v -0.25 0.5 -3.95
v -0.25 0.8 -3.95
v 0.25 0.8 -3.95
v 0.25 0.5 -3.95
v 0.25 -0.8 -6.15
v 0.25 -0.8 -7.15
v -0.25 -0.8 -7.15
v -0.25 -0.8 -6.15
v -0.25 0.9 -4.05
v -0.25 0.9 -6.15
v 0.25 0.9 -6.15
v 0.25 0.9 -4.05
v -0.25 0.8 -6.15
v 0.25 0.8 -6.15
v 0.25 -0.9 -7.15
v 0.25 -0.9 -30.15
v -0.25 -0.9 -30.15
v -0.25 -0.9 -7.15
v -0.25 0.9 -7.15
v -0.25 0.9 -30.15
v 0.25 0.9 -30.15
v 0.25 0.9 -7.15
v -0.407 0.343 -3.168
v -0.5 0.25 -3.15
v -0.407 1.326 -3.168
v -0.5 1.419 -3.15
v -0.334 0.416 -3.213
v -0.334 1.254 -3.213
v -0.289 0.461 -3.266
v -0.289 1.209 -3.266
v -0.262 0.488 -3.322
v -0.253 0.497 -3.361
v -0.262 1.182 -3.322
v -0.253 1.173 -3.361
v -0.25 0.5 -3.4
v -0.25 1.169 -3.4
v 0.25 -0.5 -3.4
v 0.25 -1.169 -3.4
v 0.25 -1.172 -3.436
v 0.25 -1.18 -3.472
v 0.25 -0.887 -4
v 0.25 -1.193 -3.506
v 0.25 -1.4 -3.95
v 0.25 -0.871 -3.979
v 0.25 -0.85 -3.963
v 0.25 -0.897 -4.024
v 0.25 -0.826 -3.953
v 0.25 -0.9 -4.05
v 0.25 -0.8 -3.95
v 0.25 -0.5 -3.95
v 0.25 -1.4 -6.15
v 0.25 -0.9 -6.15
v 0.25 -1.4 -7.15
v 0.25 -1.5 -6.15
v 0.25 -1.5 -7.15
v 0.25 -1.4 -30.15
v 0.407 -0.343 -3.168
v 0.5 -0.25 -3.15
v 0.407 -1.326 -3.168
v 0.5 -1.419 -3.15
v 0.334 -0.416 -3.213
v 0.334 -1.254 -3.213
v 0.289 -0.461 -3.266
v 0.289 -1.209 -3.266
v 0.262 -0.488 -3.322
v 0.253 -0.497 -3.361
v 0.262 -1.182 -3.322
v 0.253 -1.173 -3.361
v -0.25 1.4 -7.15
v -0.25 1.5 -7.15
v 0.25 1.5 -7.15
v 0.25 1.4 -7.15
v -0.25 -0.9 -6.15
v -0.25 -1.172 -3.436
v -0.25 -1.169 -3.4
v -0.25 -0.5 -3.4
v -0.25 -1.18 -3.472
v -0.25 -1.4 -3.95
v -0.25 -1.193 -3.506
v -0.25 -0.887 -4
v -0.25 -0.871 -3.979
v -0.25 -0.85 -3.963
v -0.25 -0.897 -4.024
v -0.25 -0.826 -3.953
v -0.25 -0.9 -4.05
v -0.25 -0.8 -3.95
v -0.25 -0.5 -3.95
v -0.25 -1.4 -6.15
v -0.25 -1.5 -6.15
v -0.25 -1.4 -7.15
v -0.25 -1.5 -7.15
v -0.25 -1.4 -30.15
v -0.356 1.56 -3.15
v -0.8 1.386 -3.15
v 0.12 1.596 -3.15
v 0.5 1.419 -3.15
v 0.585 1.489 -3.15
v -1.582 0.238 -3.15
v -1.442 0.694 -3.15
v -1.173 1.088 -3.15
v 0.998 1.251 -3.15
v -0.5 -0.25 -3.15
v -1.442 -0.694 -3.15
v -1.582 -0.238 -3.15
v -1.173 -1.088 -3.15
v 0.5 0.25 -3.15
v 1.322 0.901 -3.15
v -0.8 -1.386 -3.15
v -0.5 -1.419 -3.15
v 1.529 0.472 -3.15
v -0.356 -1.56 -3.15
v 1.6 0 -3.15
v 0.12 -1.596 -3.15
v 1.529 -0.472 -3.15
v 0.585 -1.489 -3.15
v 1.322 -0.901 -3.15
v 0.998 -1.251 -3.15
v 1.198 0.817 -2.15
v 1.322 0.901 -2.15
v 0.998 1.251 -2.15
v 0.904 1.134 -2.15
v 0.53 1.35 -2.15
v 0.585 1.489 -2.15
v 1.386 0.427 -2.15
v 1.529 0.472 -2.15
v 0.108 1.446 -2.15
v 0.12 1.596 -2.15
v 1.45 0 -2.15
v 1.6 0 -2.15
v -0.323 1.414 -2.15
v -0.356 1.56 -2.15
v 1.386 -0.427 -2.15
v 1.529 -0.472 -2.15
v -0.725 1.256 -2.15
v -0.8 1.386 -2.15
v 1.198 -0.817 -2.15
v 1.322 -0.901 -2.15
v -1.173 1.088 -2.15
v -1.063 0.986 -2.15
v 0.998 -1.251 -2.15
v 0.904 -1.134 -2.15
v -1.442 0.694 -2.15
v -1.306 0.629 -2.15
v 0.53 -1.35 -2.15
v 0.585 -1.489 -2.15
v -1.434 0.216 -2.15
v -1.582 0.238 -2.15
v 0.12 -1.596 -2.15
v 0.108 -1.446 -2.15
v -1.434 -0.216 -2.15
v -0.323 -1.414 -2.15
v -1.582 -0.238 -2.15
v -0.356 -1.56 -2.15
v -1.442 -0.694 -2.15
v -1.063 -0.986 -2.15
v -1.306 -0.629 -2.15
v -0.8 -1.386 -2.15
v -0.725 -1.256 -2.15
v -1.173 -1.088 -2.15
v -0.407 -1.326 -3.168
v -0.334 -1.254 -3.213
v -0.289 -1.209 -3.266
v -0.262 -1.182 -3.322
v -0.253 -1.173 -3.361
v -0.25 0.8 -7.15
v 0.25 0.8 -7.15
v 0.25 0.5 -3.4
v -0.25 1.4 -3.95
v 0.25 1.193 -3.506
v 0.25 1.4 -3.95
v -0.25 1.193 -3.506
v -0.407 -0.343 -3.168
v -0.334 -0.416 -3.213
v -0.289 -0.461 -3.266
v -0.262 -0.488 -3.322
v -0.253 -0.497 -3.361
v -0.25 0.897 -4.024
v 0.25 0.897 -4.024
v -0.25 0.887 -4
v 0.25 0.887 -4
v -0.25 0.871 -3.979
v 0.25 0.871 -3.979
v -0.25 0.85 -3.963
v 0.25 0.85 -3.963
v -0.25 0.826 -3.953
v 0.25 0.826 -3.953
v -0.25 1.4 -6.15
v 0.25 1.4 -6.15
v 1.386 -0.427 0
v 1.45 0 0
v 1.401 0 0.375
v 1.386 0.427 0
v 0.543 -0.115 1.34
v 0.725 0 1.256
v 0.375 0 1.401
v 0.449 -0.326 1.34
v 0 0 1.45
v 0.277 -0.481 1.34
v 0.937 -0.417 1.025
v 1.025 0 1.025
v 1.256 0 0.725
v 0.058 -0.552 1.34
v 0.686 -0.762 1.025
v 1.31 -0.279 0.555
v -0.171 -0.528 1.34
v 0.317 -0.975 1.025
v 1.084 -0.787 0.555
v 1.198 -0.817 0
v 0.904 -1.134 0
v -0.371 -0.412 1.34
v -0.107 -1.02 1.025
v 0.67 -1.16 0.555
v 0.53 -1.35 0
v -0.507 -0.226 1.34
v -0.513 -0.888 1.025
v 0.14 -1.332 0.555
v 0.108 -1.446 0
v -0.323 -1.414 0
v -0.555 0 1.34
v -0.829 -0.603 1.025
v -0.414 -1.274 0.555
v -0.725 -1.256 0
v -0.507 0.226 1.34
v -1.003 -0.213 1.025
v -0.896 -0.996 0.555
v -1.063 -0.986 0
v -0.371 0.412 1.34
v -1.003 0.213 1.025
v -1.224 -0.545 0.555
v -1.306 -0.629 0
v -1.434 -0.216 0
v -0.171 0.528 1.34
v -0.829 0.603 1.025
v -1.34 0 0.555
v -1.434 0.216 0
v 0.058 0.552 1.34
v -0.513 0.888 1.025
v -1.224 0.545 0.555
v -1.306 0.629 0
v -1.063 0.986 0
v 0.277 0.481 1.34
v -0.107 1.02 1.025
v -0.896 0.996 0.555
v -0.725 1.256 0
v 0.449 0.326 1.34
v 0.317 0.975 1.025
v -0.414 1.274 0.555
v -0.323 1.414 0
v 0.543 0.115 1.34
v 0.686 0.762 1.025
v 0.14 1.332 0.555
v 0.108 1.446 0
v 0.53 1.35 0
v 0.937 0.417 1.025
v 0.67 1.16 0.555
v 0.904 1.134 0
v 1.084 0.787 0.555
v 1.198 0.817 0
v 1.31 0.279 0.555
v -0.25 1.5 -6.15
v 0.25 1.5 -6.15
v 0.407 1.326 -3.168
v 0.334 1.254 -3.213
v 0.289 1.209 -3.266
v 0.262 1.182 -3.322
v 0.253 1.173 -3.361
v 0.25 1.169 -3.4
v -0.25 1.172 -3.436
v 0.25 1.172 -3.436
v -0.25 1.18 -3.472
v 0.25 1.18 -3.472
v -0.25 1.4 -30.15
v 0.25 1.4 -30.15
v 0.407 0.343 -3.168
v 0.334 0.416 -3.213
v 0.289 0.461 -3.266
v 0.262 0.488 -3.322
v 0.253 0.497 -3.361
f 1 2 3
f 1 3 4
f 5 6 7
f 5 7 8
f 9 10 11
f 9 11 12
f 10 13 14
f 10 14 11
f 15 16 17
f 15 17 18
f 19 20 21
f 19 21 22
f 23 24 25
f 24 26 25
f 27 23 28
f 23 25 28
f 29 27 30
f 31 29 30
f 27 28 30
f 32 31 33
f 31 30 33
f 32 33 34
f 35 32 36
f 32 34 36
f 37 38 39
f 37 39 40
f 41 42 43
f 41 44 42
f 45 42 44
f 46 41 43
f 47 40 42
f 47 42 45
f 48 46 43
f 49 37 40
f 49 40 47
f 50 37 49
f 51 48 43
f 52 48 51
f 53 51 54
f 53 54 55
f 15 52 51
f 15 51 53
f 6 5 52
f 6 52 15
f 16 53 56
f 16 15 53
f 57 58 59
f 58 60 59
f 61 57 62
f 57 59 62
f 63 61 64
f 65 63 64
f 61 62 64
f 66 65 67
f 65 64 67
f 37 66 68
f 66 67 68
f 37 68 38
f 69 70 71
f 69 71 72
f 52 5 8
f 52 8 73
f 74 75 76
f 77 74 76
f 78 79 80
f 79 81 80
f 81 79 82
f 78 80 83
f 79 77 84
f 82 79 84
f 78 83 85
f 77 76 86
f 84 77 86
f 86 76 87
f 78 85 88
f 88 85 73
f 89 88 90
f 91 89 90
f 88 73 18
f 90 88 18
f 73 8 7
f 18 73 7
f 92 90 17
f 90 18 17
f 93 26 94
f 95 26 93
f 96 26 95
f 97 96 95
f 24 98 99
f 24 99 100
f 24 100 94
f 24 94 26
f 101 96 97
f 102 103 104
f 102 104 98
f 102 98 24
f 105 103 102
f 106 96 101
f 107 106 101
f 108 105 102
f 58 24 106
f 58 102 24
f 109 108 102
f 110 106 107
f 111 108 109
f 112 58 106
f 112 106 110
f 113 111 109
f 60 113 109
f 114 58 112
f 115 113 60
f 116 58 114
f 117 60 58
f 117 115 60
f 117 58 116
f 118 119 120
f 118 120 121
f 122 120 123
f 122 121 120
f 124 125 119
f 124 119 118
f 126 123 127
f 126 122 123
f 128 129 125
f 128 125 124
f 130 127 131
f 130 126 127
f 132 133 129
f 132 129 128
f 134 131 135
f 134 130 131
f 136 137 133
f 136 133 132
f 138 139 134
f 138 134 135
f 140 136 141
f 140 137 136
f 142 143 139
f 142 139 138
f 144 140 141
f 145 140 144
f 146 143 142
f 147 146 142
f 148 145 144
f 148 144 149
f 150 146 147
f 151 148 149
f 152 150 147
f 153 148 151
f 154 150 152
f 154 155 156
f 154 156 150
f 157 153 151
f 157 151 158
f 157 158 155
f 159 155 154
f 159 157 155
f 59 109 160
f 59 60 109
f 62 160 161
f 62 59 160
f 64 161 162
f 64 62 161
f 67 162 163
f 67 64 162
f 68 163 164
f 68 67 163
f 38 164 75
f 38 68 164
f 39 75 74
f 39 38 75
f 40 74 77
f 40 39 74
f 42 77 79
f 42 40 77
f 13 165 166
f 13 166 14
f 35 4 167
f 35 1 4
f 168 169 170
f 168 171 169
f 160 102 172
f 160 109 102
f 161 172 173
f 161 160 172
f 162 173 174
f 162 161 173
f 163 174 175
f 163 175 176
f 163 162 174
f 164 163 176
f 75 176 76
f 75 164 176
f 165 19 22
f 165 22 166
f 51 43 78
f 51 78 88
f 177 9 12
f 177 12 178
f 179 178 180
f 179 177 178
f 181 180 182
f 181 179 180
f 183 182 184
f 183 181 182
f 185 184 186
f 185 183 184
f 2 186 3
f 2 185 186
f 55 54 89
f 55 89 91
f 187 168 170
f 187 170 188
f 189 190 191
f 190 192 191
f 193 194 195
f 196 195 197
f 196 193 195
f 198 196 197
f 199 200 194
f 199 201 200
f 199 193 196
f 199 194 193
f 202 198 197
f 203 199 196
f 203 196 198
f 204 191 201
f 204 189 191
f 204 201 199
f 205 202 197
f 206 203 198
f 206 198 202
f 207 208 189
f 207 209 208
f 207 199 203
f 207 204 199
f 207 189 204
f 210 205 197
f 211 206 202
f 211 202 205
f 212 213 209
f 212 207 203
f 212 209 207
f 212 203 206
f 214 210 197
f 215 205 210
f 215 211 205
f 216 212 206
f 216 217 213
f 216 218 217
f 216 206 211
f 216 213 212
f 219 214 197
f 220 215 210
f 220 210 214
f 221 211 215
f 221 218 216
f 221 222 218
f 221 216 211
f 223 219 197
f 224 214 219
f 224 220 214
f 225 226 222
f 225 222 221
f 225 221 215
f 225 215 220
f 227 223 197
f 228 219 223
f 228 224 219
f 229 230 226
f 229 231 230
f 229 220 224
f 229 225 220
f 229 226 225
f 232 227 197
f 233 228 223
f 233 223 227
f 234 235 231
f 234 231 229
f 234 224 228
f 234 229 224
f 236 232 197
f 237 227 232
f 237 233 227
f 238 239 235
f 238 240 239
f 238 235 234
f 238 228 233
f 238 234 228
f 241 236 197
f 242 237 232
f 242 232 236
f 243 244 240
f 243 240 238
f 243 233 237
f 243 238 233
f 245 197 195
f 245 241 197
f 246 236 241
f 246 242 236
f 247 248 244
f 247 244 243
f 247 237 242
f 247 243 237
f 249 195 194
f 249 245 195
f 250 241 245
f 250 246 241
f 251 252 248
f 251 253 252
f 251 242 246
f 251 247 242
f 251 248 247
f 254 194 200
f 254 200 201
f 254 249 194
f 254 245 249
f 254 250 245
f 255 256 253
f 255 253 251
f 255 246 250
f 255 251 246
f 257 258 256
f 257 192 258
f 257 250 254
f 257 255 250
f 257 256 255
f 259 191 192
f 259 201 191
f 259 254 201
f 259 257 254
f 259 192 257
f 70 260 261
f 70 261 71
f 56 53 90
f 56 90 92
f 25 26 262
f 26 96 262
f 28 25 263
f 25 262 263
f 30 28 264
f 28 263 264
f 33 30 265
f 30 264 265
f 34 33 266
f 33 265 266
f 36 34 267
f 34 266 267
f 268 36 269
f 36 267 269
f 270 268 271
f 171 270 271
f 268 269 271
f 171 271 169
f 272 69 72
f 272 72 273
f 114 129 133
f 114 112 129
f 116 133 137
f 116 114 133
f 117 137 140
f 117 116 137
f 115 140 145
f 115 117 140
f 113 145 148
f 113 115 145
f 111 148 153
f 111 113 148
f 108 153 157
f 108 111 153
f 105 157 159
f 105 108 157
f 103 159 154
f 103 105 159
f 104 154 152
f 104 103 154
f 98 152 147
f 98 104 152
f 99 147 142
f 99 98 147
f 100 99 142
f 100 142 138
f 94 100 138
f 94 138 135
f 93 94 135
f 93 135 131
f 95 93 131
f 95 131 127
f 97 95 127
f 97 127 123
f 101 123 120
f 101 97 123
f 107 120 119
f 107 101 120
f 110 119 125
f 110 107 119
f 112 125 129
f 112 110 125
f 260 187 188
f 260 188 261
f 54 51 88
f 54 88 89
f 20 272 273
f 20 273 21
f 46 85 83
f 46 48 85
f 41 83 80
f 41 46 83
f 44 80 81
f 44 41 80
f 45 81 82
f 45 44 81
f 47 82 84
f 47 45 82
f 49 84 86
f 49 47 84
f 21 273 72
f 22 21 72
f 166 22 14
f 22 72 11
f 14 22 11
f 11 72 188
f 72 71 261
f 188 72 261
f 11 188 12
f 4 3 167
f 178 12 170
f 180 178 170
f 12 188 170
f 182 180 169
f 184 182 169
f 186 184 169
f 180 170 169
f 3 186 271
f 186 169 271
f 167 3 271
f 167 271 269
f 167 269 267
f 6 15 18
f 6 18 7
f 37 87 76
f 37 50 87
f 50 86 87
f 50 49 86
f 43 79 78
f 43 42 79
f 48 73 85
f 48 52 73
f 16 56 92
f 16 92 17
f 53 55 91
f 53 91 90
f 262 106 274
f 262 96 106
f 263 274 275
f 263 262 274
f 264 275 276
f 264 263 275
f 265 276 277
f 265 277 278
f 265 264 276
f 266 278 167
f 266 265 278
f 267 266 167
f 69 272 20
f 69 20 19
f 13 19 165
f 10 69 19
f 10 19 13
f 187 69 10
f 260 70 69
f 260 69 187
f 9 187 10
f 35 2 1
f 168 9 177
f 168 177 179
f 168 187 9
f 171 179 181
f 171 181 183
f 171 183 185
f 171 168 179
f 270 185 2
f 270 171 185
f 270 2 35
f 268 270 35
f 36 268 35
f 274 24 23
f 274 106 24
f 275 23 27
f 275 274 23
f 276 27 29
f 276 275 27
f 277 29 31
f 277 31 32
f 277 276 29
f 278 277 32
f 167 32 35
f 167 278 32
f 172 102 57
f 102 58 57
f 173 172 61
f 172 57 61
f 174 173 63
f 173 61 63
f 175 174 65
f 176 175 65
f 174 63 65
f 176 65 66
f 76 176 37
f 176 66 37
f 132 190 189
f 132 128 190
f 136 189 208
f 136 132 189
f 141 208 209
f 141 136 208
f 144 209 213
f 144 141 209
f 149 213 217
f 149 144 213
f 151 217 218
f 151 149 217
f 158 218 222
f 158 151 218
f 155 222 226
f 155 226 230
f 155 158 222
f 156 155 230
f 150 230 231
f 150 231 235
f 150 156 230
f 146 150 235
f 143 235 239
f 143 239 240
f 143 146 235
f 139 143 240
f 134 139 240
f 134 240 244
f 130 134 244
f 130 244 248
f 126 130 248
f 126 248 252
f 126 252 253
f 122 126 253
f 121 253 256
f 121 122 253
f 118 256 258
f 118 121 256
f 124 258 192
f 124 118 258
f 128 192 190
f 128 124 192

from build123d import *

# Parameters (mm, degrees)
EXTRUDE1_DEPTH = 0.25
FILLET1_R      = 0.25


with BuildPart() as part:
    # Sketch1 → Revolve1 (revolve)
    with BuildSketch(Plane(origin=(0, 0, 0), x_dir=(0, 0, -1), z_dir=(1, 0, 0)), mode=Mode.PRIVATE) as revolve1_sk:
        with BuildLine():
            Line((0, 1.45), (2.15, 1.45))
            Line((2.15, 1.45), (2.15, 1.599999975))
            Line((2.15, 1.599999975), (3.15, 1.599999975))
            Line((3.15, 1.599999975), (3.15, 0))
            Line((3.15, 0), (-1.45, 0))
            ThreePointArc((-1.45, 0), (-1.025304833, 1.025304833), (0, 1.45))
        make_face()
    revolve(revolve1_sk.sketch.rotate(Axis((0, 0, 0), (0, 0, -1)), 90), axis=Axis((0, 0, 0), (0, 0, -1)))

    # Sketch2 → Extrude1 (add, symmetric)
    with BuildSketch(Plane(origin=(0, 0, 0), x_dir=(0, 0, -1), z_dir=(1, 0, 0))):
        with BuildLine():
            Line((3.15, 1.026953873), (3.95, 1.4))
            Line((3.95, 1.4), (6.15, 1.4))
            Line((6.15, 1.4), (6.15, 1.5))
            Line((6.15, 1.5), (7.15, 1.5))
            Line((7.15, 1.5), (7.15, 1.4))
            Line((7.15, 1.4), (30.15, 1.4))
            Line((30.15, 1.4), (30.15, 0.9))
            Line((30.15, 0.9), (7.15, 0.9))
            Line((7.15, 0.9), (7.15, 0.8))
            Line((7.15, 0.8), (6.15, 0.8))
            Line((6.15, 0.8), (6.15, 0.9))
            Line((6.15, 0.9), (4.05, 0.9))
            ThreePointArc((4.05, 0.9), (3.979289322, 0.870710678), (3.95, 0.8))
            Line((3.95, 0.8), (3.95, 0.5))
            Line((3.95, 0.5), (3.15, 0.5))
            Line((3.15, 0.5), (3.15, 1.026953873))
        make_face()
        with BuildLine():
            Line((3.95, -0.8), (3.95, -0.5))
            Line((3.95, -0.5), (3.15, -0.5))
            Line((3.15, -0.5), (3.15, -1.026953873))
            Line((3.15, -1.026953873), (3.95, -1.4))
            Line((3.95, -1.4), (6.15, -1.4))
            Line((6.15, -1.4), (6.15, -1.5))
            Line((6.15, -1.5), (7.15, -1.5))
            Line((7.15, -1.5), (7.15, -1.4))
            Line((7.15, -1.4), (30.15, -1.4))
            Line((30.15, -1.4), (30.15, -0.9))
            Line((30.15, -0.9), (7.15, -0.9))
            Line((7.15, -0.9), (7.15, -0.8))
            Line((7.15, -0.8), (6.15, -0.8))
            Line((6.15, -0.8), (6.15, -0.9))
            Line((6.15, -0.9), (4.05, -0.9))
            ThreePointArc((4.05, -0.9), (3.979289322, -0.870710678), (3.95, -0.8))
        make_face()
    extrude(amount=EXTRUDE1_DEPTH, both=True)

    # Fillet1
    fillet1_edges = [part.edges().sort_by_distance(p)[0] for p in [
        (-0.25, 0.763476937, -3.15),
        (0, 1.026953873, -3.15),
        (0, 0.5, -3.15),
        (0.25, 0.763476937, -3.15),
        (-0.25, -0.763476937, -3.15),
        (0, -0.5, -3.15),
        (0, -1.026953873, -3.15),
        (0.25, -0.763476937, -3.15),
    ]]
    fillet(fillet1_edges, radius=FILLET1_R)


solid = part.part
